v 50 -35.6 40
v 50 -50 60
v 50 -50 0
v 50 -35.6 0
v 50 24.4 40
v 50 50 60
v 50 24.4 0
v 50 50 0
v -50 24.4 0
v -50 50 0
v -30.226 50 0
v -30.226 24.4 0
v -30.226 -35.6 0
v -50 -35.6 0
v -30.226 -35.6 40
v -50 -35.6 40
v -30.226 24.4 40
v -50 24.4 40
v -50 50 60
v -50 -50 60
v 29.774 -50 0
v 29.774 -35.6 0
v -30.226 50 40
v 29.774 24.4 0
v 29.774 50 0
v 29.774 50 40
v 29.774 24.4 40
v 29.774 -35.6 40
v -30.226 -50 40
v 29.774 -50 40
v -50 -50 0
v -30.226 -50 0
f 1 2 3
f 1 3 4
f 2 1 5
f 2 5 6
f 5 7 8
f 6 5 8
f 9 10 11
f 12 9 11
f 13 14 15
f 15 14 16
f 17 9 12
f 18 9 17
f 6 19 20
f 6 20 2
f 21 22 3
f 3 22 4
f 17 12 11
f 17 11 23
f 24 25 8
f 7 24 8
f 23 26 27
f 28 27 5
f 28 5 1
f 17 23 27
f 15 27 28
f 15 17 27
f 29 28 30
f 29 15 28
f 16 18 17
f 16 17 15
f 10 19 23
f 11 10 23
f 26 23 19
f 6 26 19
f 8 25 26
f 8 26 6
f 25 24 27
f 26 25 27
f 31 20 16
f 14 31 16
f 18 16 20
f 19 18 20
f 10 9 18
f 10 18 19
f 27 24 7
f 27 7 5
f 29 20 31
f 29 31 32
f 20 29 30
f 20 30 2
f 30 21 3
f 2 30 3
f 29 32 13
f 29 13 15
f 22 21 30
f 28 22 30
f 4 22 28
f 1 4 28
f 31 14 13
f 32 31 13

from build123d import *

# Parameters (mm, degrees)
F0_W     = 100
F0_H     = 100
F1_DEPTH = 100
F2_W     = 100
F2_H     = 100
F3_DEPTH = 40
F4_W     = 60
F4_H     = 40
F5_DEPTH = 176
F6_W     = 60
F6_H     = 40
F7_DEPTH = 223


with BuildPart() as f1:
    # F0 (on Top) → F1 (new body)
    with BuildSketch(Plane.XY):
        Rectangle(F0_W, F0_H)
    extrude(amount=F1_DEPTH)

    # F2 (on face) → F3 (cut)
    with BuildSketch(Plane.XY.offset(100)):
        Rectangle(F2_W, F2_H)
    extrude(amount=-F3_DEPTH, mode=Mode.SUBTRACT)

    # F4 (on face) → F5 (cut)
    with BuildSketch(Plane.XZ.offset(50)):
        with Locations((-0.226441, 20)):
            Rectangle(F4_W, F4_H)
    extrude(amount=-F5_DEPTH, mode=Mode.SUBTRACT)

    # F6 (on face) → F7 (cut)
    with BuildSketch(Plane(origin=(-50, 0, 0), x_dir=(0, -1, 0), z_dir=(-1, 0, 0))):
        with Locations((5.599647, 20)):
            Rectangle(F6_W, F6_H)
    extrude(amount=-F7_DEPTH, mode=Mode.SUBTRACT)


solid = f1.part
